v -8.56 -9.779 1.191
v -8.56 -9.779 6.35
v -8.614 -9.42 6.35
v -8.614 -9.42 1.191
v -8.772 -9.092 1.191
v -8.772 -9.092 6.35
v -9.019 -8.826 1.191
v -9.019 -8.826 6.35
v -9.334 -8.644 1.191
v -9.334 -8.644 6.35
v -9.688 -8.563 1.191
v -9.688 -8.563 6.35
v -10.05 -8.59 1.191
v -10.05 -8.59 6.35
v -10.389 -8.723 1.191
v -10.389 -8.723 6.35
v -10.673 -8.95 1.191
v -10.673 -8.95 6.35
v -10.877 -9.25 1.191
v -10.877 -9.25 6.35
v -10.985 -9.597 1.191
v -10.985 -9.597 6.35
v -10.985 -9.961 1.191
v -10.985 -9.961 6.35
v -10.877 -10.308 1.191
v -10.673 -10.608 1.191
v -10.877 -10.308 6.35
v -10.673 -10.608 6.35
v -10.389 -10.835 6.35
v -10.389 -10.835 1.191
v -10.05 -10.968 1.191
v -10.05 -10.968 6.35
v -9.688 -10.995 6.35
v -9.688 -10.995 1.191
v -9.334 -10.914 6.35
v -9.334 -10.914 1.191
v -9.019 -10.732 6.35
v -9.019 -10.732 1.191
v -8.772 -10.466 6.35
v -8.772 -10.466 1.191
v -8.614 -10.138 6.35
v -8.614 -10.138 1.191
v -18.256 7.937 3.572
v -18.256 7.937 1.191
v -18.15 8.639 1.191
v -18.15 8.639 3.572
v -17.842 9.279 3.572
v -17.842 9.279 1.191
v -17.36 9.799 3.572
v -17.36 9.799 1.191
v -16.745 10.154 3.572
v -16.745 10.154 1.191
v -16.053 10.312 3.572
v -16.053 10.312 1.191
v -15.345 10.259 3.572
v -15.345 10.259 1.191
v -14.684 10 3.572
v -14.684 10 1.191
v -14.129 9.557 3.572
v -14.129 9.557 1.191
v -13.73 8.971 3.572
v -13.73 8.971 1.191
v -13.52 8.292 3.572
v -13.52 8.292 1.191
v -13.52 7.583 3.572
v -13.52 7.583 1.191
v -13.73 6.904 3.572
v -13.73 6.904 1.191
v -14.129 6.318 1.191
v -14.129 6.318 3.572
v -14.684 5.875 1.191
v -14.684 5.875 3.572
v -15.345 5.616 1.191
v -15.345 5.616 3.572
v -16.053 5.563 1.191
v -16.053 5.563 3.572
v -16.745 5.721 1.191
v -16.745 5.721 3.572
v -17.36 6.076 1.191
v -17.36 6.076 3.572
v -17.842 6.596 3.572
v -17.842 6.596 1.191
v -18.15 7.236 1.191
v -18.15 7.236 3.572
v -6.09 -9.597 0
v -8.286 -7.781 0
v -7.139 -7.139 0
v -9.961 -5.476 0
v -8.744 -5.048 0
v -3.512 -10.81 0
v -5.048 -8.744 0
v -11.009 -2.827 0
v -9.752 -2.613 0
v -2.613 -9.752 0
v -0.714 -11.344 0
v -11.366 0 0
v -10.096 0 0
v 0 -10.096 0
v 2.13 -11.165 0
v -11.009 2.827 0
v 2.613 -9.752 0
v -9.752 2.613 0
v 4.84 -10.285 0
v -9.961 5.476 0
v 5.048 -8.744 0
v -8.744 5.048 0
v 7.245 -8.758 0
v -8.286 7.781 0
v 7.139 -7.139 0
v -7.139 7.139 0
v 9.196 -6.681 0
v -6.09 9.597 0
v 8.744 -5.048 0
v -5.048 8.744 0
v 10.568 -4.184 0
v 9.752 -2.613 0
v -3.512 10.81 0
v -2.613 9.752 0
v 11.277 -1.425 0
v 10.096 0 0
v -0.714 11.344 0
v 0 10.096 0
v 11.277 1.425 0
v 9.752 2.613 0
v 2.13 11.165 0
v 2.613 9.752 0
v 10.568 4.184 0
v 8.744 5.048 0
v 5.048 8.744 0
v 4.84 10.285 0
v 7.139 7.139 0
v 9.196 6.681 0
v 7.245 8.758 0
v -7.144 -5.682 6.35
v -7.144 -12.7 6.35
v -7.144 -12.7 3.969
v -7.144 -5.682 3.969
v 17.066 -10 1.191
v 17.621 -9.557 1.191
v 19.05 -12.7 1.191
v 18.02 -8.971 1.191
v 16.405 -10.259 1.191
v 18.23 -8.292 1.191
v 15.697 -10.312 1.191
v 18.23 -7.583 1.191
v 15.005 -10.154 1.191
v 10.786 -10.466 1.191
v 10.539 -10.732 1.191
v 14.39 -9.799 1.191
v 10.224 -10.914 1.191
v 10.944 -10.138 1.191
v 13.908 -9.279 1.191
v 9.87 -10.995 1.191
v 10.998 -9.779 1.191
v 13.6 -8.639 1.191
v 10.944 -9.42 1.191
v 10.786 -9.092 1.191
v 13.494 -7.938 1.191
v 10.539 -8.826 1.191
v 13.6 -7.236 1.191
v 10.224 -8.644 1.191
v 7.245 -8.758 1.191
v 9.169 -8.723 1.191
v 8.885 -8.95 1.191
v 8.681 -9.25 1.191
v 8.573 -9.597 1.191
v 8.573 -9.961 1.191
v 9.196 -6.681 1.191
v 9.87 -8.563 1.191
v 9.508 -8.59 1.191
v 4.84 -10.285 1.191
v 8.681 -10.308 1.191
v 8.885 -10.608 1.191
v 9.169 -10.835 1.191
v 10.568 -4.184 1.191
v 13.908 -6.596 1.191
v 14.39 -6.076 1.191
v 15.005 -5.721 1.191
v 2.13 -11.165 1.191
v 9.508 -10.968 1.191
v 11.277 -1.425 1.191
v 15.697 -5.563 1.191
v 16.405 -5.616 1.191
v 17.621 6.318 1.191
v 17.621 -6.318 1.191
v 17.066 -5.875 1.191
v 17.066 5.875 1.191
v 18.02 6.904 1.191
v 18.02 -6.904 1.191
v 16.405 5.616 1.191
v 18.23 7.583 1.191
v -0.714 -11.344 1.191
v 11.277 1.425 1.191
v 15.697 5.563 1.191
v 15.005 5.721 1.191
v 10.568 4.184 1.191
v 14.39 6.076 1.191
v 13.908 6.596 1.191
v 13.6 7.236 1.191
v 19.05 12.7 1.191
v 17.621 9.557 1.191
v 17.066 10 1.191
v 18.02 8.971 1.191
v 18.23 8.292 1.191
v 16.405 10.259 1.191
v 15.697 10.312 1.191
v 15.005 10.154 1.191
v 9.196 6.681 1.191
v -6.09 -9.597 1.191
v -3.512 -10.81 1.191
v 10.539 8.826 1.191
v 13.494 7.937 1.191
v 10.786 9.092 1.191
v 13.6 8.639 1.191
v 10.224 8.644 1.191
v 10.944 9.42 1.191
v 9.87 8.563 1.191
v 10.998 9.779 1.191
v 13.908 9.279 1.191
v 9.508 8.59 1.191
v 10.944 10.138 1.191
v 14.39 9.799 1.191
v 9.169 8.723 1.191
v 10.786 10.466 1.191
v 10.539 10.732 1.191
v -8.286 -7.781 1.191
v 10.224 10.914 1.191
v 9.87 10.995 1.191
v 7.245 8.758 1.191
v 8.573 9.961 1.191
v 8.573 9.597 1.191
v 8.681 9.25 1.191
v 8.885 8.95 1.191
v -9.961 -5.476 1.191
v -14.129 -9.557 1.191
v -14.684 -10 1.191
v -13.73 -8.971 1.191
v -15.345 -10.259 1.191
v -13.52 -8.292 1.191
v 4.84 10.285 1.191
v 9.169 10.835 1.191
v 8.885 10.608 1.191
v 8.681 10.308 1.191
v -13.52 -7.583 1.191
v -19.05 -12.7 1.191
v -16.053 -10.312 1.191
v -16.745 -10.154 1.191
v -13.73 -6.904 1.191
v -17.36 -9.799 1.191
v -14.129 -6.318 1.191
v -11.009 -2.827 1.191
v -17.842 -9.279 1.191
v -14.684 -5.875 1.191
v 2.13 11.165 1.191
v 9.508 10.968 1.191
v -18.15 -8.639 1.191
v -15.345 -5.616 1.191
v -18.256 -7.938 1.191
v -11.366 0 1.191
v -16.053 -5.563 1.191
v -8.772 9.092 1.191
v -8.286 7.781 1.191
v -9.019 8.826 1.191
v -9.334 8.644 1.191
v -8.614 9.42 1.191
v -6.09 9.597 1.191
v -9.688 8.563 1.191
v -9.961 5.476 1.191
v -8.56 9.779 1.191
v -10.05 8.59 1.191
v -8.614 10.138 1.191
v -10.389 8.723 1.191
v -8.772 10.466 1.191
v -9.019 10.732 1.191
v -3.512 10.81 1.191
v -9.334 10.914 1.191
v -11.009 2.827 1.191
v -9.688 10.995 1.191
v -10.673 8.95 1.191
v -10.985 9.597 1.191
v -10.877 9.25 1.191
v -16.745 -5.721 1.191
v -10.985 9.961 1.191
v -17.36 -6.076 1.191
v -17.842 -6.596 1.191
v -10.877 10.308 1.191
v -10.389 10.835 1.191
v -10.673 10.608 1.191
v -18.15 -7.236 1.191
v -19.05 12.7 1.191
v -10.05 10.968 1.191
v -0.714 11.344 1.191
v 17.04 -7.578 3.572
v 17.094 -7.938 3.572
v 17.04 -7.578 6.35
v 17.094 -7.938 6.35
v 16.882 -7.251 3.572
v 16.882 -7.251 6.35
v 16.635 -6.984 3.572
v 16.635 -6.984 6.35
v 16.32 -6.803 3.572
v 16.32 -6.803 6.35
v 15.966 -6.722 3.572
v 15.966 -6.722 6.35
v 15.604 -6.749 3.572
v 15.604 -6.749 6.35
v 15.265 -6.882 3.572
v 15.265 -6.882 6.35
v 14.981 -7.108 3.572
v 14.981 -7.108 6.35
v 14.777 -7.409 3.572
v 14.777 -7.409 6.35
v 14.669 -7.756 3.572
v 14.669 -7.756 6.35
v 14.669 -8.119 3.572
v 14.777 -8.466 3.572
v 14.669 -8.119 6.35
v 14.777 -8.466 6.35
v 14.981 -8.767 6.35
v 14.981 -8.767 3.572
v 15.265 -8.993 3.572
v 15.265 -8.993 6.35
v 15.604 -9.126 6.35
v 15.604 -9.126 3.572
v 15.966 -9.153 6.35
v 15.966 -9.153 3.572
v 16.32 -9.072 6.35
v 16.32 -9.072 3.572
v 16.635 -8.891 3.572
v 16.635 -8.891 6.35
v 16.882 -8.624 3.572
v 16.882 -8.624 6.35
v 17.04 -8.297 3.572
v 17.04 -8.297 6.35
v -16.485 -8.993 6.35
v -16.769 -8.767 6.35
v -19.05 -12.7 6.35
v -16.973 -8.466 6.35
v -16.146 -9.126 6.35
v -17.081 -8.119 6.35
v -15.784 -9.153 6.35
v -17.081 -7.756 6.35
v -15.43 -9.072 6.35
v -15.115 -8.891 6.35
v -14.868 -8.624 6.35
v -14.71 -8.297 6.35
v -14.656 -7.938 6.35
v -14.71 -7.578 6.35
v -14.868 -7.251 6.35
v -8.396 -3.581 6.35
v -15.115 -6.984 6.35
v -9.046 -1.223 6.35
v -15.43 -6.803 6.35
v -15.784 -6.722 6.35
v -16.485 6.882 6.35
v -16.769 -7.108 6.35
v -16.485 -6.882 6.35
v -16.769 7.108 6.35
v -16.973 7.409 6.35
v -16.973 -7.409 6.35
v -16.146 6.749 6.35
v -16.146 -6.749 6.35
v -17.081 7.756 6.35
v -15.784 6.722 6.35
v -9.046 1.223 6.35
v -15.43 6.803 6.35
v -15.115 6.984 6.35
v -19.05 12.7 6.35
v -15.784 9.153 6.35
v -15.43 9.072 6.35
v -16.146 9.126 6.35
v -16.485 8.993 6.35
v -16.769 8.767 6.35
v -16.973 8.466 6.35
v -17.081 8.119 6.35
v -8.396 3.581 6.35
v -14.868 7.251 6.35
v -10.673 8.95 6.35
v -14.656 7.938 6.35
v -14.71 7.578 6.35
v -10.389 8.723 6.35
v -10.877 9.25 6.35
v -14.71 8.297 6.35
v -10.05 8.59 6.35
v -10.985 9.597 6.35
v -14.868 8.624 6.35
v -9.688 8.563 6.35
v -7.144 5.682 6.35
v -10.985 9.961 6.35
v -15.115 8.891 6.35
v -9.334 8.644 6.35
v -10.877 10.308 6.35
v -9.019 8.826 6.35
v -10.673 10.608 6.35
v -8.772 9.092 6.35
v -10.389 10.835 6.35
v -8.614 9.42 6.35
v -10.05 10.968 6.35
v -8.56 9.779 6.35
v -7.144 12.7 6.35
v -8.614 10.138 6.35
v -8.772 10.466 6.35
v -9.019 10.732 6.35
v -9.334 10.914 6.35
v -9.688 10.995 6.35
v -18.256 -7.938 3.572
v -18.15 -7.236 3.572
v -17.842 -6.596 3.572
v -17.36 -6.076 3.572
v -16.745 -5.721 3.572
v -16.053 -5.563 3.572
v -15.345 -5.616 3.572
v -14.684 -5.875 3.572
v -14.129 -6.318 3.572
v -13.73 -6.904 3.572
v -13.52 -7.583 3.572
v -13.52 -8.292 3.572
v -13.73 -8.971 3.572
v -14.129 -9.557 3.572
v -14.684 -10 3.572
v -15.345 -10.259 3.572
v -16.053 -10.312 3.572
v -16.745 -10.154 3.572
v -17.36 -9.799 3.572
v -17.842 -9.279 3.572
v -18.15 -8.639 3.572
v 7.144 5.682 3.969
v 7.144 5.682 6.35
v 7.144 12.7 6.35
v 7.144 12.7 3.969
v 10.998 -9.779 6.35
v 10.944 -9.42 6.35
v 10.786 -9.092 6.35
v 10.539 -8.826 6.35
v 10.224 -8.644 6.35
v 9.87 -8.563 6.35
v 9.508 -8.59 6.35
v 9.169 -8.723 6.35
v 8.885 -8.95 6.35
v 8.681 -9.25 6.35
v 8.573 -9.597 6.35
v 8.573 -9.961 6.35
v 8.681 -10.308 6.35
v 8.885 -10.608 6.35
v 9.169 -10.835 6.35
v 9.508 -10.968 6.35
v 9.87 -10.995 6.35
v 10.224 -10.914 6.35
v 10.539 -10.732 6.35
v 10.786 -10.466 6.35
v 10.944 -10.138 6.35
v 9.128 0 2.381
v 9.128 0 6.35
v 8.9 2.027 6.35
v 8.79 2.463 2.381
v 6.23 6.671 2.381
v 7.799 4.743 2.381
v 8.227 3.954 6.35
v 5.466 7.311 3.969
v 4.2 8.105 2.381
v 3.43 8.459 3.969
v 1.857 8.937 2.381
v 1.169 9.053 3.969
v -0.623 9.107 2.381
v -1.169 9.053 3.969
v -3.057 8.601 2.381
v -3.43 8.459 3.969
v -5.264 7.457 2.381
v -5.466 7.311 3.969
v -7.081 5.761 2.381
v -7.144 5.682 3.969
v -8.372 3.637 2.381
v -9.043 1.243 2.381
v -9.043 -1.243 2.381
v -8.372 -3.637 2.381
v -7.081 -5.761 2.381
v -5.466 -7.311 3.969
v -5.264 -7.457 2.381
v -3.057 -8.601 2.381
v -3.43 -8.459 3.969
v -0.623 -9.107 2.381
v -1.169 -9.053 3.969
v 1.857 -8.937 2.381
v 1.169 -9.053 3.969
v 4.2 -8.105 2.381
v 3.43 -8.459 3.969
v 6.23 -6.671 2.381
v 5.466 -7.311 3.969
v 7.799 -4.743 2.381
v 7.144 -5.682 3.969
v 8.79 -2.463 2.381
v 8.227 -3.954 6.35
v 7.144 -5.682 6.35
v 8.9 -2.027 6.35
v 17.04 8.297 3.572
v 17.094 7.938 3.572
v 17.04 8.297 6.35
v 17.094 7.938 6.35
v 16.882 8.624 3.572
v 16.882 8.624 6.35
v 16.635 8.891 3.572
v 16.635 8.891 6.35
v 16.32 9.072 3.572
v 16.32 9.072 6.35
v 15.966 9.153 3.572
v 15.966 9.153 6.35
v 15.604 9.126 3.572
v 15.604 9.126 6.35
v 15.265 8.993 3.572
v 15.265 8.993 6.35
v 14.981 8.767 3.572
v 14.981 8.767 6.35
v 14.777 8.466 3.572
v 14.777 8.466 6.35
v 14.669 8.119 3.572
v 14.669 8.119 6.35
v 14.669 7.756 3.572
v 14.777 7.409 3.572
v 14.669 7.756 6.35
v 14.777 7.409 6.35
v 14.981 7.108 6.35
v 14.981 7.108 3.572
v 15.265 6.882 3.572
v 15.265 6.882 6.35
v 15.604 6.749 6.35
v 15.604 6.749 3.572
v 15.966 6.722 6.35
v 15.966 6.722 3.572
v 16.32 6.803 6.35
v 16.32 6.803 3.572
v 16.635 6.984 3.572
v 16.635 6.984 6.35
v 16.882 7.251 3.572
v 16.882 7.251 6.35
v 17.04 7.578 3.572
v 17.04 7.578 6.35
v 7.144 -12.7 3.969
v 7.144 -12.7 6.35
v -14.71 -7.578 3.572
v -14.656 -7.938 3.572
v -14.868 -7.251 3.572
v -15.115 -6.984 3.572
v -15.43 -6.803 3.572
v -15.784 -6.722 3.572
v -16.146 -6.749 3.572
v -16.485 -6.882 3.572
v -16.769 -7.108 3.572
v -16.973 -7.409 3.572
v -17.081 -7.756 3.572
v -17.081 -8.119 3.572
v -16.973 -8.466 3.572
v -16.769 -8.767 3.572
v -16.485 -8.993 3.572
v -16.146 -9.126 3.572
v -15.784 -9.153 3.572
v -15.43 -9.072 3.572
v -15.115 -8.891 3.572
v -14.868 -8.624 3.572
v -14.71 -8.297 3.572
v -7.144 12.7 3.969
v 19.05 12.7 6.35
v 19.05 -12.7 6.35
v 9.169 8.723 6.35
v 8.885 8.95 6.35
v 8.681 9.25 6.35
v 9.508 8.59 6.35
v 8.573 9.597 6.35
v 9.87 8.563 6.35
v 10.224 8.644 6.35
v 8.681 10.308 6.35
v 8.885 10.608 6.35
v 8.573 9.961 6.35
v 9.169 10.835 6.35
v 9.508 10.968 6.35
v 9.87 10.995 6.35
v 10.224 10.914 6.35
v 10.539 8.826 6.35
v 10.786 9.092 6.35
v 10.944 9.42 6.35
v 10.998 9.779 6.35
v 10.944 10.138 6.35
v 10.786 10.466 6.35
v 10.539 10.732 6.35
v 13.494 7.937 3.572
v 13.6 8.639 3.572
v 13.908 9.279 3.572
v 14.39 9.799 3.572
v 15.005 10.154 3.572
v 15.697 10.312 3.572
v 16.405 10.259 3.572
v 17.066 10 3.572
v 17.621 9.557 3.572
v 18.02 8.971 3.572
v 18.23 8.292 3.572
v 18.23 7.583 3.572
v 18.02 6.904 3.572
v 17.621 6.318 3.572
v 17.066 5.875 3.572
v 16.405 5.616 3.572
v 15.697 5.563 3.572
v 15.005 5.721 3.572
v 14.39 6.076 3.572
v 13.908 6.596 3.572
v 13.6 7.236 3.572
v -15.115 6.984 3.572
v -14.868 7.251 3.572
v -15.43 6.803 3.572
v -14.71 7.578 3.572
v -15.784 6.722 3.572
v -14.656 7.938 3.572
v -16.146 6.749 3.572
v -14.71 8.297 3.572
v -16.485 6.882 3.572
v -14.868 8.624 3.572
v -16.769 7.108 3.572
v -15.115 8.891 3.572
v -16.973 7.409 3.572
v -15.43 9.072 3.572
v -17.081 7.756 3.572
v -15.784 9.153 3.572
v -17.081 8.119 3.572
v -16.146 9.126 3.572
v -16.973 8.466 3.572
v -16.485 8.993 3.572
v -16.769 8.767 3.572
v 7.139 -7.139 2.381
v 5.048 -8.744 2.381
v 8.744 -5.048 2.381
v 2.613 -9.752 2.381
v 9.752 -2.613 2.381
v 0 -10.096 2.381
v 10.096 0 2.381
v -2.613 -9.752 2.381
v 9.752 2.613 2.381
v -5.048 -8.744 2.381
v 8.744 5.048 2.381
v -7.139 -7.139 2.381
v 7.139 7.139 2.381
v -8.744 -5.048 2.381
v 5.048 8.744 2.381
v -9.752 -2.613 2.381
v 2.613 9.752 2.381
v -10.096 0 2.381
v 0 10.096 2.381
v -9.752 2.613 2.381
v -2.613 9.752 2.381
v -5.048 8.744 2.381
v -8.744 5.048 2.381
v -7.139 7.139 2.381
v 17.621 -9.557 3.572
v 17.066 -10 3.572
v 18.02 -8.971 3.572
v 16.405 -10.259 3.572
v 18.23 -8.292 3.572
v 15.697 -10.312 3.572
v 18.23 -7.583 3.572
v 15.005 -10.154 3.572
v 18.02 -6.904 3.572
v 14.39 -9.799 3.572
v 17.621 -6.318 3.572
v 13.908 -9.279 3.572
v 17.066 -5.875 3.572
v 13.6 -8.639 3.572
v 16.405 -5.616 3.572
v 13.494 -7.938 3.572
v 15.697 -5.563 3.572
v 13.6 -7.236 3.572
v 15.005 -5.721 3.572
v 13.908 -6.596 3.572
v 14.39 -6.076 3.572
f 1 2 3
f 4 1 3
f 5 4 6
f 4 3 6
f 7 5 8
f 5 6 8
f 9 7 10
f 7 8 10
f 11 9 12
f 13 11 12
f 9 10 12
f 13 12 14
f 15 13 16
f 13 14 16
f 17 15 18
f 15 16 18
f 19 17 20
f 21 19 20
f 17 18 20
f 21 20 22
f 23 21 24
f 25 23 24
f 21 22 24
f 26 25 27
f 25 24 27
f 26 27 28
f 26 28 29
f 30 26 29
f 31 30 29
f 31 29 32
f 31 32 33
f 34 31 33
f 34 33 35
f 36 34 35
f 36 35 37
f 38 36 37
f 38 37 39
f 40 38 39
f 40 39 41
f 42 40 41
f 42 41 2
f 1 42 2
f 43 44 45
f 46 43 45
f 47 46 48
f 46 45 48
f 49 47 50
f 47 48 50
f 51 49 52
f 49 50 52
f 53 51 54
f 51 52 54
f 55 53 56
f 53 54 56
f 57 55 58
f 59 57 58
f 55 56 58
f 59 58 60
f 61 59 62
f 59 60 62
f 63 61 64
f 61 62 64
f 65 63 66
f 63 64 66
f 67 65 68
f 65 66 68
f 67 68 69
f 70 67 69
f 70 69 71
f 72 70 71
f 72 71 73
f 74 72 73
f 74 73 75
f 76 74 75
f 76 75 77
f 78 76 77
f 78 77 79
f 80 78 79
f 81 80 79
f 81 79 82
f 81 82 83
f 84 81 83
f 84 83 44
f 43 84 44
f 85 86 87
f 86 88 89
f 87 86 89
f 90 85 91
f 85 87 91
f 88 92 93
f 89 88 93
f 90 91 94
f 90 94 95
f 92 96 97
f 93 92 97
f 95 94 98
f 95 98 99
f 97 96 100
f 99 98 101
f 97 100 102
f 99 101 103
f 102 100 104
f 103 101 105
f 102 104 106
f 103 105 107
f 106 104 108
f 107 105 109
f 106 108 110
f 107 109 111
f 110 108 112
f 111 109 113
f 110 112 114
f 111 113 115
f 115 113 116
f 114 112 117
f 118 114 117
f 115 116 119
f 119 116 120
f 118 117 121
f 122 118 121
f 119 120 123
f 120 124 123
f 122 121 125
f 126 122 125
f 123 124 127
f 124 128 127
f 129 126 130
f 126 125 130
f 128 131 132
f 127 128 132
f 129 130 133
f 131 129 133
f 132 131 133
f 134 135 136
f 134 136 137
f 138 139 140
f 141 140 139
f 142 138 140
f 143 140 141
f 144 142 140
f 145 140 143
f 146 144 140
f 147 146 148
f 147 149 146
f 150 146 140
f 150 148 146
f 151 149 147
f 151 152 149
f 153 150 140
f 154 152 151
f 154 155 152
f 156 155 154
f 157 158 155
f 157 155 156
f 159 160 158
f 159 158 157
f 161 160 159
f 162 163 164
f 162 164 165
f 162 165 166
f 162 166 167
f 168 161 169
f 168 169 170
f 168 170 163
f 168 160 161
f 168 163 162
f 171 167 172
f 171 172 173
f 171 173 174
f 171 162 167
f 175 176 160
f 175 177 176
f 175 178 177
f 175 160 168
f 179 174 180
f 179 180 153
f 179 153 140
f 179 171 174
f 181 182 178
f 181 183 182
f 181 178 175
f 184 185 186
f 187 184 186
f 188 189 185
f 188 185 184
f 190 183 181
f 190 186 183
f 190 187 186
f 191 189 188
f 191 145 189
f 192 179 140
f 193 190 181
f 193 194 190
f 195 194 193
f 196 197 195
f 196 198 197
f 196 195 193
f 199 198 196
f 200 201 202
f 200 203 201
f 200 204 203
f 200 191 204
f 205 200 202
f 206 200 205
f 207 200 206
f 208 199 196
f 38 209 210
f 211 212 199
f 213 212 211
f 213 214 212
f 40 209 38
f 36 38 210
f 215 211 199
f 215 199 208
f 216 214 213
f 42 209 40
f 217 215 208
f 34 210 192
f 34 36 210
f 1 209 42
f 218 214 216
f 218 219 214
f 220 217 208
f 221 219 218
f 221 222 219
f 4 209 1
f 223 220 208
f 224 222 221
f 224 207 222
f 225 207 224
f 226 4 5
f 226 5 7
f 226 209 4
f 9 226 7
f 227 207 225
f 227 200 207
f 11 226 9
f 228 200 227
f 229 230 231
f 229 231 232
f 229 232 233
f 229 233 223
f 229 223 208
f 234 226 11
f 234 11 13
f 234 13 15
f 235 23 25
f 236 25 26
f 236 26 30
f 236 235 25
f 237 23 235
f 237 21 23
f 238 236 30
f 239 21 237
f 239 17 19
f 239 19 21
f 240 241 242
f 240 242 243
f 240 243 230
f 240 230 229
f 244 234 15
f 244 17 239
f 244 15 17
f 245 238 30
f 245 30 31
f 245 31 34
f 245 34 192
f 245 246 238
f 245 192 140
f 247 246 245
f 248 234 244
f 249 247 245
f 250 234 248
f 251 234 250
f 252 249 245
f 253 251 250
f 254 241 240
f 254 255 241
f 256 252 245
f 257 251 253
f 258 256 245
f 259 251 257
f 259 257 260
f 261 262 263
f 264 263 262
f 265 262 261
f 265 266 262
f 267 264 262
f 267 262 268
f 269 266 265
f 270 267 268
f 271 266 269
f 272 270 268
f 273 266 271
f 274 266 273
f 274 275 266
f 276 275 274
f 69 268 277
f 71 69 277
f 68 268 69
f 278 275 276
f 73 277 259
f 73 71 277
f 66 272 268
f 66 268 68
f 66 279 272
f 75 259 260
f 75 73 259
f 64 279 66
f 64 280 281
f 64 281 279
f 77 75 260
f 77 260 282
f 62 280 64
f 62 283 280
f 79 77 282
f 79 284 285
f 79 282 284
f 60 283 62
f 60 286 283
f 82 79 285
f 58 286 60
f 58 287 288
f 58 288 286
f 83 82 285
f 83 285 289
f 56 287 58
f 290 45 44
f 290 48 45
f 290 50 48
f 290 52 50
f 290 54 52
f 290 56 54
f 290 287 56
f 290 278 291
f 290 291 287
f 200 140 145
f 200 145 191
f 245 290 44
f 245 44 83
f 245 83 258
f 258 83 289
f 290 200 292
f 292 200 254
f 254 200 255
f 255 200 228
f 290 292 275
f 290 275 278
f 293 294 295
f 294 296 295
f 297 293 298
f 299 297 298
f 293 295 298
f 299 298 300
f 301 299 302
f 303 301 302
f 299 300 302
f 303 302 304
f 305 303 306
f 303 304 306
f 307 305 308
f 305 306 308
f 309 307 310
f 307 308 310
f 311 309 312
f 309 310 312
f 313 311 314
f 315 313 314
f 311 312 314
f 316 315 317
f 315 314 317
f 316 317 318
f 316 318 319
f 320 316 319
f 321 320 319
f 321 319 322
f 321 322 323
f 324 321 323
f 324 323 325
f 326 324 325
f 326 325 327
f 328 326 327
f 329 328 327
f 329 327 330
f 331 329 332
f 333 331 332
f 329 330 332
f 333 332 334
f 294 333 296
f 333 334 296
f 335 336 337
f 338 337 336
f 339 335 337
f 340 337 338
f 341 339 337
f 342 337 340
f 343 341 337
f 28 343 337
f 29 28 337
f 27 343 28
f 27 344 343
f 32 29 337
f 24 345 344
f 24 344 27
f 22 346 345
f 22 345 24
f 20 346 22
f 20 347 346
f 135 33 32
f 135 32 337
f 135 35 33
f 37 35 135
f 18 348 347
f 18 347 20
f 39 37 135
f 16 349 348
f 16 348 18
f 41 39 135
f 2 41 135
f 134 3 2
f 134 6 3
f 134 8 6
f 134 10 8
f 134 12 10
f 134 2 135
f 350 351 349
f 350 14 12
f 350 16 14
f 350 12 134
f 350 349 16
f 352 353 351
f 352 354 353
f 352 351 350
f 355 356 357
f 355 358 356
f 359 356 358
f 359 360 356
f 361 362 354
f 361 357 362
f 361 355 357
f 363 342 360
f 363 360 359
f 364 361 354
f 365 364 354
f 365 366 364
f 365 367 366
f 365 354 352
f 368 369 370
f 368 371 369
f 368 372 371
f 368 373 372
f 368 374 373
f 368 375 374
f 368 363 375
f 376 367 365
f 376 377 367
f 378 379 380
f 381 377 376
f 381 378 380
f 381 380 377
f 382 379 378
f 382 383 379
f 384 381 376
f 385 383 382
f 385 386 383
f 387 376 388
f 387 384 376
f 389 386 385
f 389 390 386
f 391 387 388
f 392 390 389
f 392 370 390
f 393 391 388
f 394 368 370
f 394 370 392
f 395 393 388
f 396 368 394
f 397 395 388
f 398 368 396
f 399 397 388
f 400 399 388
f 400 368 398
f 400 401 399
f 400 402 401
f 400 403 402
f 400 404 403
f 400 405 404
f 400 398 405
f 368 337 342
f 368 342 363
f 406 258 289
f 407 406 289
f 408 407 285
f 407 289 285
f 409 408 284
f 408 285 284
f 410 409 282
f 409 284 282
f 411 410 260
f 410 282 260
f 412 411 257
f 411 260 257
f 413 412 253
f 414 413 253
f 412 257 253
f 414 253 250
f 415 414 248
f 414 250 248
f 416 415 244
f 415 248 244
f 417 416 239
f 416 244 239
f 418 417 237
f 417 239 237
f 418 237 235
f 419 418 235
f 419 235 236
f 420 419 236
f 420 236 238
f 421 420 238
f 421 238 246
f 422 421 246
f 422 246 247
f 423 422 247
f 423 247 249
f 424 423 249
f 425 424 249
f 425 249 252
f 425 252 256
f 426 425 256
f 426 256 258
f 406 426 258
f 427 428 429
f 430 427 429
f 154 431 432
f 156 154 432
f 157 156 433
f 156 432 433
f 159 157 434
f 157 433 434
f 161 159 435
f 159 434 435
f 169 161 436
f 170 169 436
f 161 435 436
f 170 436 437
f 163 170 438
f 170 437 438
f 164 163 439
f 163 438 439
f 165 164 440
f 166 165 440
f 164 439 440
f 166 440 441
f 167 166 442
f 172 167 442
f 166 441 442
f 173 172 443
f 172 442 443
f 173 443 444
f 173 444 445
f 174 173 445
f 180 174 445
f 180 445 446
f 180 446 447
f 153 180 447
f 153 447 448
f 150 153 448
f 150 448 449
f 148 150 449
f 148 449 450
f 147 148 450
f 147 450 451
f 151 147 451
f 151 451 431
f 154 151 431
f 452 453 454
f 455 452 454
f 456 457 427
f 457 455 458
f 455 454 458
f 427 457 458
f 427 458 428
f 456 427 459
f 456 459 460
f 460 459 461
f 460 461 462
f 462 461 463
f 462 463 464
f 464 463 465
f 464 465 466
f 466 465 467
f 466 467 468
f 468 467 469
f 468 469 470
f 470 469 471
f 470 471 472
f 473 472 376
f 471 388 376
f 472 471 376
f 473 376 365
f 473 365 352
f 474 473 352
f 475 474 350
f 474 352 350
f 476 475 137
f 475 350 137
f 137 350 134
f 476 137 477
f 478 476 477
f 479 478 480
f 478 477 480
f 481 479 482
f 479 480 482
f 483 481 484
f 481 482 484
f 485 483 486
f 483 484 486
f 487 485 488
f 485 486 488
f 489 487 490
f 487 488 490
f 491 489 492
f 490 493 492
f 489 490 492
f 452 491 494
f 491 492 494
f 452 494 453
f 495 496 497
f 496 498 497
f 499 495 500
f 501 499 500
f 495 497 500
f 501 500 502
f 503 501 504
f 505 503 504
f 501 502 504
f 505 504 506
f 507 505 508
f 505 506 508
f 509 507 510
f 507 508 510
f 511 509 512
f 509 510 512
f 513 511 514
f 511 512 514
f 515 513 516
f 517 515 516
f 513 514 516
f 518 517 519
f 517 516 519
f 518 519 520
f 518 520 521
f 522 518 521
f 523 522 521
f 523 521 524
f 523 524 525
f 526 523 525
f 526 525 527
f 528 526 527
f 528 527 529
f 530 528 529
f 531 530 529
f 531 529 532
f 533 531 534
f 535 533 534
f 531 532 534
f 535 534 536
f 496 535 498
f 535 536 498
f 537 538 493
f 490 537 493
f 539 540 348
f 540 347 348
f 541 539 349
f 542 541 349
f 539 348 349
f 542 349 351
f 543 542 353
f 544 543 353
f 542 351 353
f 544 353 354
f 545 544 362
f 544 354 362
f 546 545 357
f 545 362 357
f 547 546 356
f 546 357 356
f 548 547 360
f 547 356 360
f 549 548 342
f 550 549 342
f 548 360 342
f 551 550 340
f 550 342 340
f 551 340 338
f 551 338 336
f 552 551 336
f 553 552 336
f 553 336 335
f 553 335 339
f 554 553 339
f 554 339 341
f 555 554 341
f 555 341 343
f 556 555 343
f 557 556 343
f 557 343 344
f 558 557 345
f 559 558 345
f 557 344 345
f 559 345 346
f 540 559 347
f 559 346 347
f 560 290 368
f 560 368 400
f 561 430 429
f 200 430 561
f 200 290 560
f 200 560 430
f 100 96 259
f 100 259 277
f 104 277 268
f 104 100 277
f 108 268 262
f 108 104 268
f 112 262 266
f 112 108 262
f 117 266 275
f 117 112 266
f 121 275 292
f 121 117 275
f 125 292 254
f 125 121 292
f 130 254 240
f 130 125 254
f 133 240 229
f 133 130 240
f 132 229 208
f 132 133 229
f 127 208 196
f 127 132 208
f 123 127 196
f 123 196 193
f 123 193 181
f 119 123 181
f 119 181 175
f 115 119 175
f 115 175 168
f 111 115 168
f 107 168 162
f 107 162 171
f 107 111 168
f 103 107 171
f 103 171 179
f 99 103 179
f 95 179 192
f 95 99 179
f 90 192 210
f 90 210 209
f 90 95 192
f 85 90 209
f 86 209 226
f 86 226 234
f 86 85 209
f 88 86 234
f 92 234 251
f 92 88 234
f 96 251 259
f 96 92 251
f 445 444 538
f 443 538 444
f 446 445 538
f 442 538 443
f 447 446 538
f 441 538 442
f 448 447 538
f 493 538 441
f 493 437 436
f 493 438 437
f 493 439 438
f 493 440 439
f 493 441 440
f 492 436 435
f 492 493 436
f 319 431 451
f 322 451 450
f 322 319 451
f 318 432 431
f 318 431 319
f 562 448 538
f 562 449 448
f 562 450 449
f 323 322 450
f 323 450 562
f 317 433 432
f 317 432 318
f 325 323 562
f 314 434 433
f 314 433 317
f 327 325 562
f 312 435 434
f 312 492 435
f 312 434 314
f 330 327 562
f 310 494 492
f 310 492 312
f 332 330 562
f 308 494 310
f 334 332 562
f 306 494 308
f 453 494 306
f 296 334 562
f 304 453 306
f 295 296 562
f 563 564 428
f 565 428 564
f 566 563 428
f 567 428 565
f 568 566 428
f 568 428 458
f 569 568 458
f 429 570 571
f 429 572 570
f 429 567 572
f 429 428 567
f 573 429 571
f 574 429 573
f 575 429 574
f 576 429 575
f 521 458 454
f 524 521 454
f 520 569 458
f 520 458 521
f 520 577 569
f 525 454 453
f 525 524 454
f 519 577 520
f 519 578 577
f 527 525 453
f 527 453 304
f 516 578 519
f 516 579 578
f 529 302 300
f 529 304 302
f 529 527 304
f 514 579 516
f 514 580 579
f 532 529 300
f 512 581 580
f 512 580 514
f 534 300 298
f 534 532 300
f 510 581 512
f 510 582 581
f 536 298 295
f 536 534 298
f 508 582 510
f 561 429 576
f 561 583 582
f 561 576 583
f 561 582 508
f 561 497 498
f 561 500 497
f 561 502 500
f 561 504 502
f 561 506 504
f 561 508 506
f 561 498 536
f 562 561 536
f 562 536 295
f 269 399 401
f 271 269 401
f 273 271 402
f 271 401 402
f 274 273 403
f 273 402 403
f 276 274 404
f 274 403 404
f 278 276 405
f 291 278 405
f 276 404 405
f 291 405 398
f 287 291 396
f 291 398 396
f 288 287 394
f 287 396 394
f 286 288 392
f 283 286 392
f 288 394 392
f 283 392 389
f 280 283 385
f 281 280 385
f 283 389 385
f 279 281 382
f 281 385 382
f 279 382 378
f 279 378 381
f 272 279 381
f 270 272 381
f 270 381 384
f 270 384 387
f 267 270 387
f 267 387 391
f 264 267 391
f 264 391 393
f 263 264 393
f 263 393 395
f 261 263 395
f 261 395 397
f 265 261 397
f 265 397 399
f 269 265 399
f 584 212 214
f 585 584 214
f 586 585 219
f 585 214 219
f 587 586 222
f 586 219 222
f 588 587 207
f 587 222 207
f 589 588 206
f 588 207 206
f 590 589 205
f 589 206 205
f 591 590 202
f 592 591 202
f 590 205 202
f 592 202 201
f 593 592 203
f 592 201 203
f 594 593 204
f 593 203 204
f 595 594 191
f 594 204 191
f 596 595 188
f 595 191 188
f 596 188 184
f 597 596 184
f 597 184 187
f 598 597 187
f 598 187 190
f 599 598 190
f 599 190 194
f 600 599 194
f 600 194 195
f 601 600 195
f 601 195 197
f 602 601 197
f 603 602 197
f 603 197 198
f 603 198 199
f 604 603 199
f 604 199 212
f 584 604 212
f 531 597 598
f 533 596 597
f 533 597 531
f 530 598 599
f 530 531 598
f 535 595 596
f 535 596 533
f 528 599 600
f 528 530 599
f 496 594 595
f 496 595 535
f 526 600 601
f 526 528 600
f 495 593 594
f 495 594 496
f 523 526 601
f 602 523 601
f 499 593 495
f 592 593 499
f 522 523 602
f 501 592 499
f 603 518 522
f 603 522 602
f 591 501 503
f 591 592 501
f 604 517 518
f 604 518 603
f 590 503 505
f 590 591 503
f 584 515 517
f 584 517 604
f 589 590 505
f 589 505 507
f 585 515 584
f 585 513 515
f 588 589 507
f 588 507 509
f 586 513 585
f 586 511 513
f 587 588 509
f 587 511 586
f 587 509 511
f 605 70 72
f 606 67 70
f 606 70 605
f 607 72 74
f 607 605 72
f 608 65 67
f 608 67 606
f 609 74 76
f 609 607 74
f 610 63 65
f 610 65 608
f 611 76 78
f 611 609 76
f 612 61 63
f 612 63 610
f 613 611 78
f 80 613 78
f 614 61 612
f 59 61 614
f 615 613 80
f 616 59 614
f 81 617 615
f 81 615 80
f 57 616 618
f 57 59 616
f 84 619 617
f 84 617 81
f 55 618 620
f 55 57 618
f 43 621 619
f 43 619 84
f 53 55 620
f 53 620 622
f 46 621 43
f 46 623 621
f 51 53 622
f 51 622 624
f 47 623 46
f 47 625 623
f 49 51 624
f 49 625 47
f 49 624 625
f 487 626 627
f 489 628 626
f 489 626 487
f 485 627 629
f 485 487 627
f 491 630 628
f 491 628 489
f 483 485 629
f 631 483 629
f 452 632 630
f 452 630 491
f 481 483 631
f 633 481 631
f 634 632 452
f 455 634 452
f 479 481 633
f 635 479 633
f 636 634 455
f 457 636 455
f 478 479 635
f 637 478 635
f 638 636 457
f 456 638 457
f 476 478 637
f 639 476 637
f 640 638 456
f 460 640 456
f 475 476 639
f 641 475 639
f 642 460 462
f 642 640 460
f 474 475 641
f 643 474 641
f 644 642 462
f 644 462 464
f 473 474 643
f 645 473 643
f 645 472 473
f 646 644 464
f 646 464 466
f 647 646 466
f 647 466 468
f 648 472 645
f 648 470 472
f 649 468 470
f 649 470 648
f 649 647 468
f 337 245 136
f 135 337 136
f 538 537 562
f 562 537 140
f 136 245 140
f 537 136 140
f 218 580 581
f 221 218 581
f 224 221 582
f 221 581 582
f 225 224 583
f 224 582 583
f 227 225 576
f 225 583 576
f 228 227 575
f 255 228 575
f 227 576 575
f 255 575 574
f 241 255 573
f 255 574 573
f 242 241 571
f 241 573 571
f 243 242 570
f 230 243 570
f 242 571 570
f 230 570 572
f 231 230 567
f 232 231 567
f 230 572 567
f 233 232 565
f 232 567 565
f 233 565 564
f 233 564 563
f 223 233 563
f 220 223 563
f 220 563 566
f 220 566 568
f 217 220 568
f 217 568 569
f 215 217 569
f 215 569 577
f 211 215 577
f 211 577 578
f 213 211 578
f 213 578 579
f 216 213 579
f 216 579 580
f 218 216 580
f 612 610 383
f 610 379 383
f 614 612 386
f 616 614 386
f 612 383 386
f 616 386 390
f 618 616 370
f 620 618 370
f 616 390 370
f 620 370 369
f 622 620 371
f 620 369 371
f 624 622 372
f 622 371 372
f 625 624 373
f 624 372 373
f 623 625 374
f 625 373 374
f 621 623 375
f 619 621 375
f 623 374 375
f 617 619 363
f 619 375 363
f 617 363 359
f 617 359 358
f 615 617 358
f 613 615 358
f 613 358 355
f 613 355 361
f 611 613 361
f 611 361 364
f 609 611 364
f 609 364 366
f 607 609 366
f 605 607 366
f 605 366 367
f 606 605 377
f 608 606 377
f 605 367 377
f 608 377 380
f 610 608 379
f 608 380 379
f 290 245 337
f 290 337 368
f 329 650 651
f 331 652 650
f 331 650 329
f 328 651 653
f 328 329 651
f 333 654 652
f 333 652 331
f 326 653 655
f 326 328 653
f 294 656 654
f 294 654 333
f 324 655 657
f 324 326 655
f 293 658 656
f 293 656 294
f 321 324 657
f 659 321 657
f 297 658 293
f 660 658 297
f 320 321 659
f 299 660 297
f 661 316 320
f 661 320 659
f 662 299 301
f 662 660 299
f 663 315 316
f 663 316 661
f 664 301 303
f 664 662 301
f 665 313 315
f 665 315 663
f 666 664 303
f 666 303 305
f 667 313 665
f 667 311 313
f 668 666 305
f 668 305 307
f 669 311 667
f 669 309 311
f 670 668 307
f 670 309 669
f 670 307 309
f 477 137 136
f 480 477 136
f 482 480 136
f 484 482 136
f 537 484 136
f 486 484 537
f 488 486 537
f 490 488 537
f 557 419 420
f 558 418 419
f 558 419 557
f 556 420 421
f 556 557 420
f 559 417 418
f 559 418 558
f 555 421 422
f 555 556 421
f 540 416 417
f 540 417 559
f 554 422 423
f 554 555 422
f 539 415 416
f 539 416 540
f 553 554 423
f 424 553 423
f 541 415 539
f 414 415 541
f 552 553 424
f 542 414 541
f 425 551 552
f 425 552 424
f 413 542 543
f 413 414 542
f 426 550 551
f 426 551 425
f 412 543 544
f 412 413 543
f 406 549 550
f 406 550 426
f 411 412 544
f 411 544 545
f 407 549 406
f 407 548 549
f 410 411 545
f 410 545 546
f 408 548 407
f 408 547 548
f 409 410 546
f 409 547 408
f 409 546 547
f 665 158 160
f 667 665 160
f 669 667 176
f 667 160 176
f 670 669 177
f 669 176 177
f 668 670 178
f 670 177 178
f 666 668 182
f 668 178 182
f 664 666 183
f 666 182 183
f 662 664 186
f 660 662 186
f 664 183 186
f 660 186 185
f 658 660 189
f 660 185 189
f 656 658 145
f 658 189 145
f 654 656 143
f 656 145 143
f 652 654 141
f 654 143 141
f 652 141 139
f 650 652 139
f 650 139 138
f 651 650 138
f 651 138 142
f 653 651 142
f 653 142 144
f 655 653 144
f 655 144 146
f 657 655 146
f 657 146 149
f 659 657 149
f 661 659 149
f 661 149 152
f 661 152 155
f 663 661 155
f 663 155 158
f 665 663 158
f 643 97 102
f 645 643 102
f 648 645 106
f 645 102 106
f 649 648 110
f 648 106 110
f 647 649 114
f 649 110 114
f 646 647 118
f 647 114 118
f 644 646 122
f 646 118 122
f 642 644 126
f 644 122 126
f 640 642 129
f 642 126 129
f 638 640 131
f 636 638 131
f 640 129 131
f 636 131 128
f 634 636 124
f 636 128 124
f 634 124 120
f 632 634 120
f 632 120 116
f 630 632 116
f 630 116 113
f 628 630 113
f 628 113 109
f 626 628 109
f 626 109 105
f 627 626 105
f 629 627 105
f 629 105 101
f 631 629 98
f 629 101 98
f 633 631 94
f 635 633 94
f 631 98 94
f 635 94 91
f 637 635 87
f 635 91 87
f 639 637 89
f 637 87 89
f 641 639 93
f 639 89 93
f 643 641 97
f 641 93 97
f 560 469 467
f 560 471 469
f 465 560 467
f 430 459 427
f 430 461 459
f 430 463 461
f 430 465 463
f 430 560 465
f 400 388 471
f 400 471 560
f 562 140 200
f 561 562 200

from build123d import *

# Parameters (mm, degrees)
SKETCH1_W                                       = 38.1
SKETCH1_H                                       = 25.4
BOSS_EXTRUDE1_DEPTH                             = 6.35
SKETCH6_R                                       = 9.128125
CUT_EXTRUDE1_DEPTH                              = 24.759524406
SKETCH8_W                                       = 14.2875
SKETCH8_H                                       = 25.4
CUT_EXTRUDE2_DEPTH                              = 2.38125
SKETCH14_W                                      = 38.1
SKETCH14_H                                      = 25.4
SKETCH14_R                                      = 11.3665
CUT_EXTRUDE3_DEPTH                              = 1.190625
SKETCH19_R                                      = 10.0965
CUT_EXTRUDE4_DEPTH                              = 2.38125
F_2_CLEARANCE_HOLE1_D                           = 2.4384
CBORE_FOR_2_PAN_HEAD_MACHINE_SCREW1_D           = 2.4384
CBORE_FOR_2_PAN_HEAD_MACHINE_SCREW1_CBORE_D     = 4.7625
CBORE_FOR_2_PAN_HEAD_MACHINE_SCREW1_CBORE_DEPTH = 2.38125


with BuildPart() as part:
    # Sketch1 → Boss-Extrude1 (new body)
    with BuildSketch(Plane.XY):
        Rectangle(SKETCH1_W, SKETCH1_H)
    extrude(amount=BOSS_EXTRUDE1_DEPTH)

    # Sketch6 → Cut-Extrude1 (cut, through all)
    with BuildSketch(Plane.XY.offset(6.35)):
        Circle(SKETCH6_R)
    extrude(amount=-CUT_EXTRUDE1_DEPTH, mode=Mode.SUBTRACT)

    # Sketch8 → Cut-Extrude2 (cut)
    with BuildSketch(Plane.XY.offset(6.35)):
        Rectangle(SKETCH8_W, SKETCH8_H)
    extrude(amount=-CUT_EXTRUDE2_DEPTH, mode=Mode.SUBTRACT)

    # Sketch14 → Cut-Extrude3 (cut)
    with BuildSketch(Plane(origin=(0, 0, 0), x_dir=(-1, 0, 0), z_dir=(0, 0, -1))):
        Rectangle(SKETCH14_W, SKETCH14_H)
        Circle(SKETCH14_R, mode=Mode.SUBTRACT)
    extrude(amount=-CUT_EXTRUDE3_DEPTH, mode=Mode.SUBTRACT)

    # Sketch19 → Cut-Extrude4 (cut)
    with BuildSketch(Plane(origin=(0, 0, 0), x_dir=(-1, 0, 0), z_dir=(0, 0, -1))):
        Circle(SKETCH19_R)
    extrude(amount=-CUT_EXTRUDE4_DEPTH, mode=Mode.SUBTRACT)

    # #2 Clearance Hole1 (through all)
    with Locations(Plane(origin=(0, 0, 1.190625), x_dir=(-1, 0, 0), z_dir=(0, 0, -1))):
        with Locations((-9.779, 9.779), (9.779, 9.779), (9.779, -9.779), (-9.779, -9.779)):
            Hole(F_2_CLEARANCE_HOLE1_D / 2)

    # CBORE for #2 Pan Head Machine Screw1 (through all)
    with Locations(Plane(origin=(0, 0, 1.190625), x_dir=(-1, 0, 0), z_dir=(0, 0, -1))):
        with Locations((-15.875, 7.9375), (-15.875, -7.9375), (15.875, -7.9375), (15.875, 7.9375)):
            CounterBoreHole(CBORE_FOR_2_PAN_HEAD_MACHINE_SCREW1_D / 2, CBORE_FOR_2_PAN_HEAD_MACHINE_SCREW1_CBORE_D / 2, CBORE_FOR_2_PAN_HEAD_MACHINE_SCREW1_CBORE_DEPTH)


solid = part.part
